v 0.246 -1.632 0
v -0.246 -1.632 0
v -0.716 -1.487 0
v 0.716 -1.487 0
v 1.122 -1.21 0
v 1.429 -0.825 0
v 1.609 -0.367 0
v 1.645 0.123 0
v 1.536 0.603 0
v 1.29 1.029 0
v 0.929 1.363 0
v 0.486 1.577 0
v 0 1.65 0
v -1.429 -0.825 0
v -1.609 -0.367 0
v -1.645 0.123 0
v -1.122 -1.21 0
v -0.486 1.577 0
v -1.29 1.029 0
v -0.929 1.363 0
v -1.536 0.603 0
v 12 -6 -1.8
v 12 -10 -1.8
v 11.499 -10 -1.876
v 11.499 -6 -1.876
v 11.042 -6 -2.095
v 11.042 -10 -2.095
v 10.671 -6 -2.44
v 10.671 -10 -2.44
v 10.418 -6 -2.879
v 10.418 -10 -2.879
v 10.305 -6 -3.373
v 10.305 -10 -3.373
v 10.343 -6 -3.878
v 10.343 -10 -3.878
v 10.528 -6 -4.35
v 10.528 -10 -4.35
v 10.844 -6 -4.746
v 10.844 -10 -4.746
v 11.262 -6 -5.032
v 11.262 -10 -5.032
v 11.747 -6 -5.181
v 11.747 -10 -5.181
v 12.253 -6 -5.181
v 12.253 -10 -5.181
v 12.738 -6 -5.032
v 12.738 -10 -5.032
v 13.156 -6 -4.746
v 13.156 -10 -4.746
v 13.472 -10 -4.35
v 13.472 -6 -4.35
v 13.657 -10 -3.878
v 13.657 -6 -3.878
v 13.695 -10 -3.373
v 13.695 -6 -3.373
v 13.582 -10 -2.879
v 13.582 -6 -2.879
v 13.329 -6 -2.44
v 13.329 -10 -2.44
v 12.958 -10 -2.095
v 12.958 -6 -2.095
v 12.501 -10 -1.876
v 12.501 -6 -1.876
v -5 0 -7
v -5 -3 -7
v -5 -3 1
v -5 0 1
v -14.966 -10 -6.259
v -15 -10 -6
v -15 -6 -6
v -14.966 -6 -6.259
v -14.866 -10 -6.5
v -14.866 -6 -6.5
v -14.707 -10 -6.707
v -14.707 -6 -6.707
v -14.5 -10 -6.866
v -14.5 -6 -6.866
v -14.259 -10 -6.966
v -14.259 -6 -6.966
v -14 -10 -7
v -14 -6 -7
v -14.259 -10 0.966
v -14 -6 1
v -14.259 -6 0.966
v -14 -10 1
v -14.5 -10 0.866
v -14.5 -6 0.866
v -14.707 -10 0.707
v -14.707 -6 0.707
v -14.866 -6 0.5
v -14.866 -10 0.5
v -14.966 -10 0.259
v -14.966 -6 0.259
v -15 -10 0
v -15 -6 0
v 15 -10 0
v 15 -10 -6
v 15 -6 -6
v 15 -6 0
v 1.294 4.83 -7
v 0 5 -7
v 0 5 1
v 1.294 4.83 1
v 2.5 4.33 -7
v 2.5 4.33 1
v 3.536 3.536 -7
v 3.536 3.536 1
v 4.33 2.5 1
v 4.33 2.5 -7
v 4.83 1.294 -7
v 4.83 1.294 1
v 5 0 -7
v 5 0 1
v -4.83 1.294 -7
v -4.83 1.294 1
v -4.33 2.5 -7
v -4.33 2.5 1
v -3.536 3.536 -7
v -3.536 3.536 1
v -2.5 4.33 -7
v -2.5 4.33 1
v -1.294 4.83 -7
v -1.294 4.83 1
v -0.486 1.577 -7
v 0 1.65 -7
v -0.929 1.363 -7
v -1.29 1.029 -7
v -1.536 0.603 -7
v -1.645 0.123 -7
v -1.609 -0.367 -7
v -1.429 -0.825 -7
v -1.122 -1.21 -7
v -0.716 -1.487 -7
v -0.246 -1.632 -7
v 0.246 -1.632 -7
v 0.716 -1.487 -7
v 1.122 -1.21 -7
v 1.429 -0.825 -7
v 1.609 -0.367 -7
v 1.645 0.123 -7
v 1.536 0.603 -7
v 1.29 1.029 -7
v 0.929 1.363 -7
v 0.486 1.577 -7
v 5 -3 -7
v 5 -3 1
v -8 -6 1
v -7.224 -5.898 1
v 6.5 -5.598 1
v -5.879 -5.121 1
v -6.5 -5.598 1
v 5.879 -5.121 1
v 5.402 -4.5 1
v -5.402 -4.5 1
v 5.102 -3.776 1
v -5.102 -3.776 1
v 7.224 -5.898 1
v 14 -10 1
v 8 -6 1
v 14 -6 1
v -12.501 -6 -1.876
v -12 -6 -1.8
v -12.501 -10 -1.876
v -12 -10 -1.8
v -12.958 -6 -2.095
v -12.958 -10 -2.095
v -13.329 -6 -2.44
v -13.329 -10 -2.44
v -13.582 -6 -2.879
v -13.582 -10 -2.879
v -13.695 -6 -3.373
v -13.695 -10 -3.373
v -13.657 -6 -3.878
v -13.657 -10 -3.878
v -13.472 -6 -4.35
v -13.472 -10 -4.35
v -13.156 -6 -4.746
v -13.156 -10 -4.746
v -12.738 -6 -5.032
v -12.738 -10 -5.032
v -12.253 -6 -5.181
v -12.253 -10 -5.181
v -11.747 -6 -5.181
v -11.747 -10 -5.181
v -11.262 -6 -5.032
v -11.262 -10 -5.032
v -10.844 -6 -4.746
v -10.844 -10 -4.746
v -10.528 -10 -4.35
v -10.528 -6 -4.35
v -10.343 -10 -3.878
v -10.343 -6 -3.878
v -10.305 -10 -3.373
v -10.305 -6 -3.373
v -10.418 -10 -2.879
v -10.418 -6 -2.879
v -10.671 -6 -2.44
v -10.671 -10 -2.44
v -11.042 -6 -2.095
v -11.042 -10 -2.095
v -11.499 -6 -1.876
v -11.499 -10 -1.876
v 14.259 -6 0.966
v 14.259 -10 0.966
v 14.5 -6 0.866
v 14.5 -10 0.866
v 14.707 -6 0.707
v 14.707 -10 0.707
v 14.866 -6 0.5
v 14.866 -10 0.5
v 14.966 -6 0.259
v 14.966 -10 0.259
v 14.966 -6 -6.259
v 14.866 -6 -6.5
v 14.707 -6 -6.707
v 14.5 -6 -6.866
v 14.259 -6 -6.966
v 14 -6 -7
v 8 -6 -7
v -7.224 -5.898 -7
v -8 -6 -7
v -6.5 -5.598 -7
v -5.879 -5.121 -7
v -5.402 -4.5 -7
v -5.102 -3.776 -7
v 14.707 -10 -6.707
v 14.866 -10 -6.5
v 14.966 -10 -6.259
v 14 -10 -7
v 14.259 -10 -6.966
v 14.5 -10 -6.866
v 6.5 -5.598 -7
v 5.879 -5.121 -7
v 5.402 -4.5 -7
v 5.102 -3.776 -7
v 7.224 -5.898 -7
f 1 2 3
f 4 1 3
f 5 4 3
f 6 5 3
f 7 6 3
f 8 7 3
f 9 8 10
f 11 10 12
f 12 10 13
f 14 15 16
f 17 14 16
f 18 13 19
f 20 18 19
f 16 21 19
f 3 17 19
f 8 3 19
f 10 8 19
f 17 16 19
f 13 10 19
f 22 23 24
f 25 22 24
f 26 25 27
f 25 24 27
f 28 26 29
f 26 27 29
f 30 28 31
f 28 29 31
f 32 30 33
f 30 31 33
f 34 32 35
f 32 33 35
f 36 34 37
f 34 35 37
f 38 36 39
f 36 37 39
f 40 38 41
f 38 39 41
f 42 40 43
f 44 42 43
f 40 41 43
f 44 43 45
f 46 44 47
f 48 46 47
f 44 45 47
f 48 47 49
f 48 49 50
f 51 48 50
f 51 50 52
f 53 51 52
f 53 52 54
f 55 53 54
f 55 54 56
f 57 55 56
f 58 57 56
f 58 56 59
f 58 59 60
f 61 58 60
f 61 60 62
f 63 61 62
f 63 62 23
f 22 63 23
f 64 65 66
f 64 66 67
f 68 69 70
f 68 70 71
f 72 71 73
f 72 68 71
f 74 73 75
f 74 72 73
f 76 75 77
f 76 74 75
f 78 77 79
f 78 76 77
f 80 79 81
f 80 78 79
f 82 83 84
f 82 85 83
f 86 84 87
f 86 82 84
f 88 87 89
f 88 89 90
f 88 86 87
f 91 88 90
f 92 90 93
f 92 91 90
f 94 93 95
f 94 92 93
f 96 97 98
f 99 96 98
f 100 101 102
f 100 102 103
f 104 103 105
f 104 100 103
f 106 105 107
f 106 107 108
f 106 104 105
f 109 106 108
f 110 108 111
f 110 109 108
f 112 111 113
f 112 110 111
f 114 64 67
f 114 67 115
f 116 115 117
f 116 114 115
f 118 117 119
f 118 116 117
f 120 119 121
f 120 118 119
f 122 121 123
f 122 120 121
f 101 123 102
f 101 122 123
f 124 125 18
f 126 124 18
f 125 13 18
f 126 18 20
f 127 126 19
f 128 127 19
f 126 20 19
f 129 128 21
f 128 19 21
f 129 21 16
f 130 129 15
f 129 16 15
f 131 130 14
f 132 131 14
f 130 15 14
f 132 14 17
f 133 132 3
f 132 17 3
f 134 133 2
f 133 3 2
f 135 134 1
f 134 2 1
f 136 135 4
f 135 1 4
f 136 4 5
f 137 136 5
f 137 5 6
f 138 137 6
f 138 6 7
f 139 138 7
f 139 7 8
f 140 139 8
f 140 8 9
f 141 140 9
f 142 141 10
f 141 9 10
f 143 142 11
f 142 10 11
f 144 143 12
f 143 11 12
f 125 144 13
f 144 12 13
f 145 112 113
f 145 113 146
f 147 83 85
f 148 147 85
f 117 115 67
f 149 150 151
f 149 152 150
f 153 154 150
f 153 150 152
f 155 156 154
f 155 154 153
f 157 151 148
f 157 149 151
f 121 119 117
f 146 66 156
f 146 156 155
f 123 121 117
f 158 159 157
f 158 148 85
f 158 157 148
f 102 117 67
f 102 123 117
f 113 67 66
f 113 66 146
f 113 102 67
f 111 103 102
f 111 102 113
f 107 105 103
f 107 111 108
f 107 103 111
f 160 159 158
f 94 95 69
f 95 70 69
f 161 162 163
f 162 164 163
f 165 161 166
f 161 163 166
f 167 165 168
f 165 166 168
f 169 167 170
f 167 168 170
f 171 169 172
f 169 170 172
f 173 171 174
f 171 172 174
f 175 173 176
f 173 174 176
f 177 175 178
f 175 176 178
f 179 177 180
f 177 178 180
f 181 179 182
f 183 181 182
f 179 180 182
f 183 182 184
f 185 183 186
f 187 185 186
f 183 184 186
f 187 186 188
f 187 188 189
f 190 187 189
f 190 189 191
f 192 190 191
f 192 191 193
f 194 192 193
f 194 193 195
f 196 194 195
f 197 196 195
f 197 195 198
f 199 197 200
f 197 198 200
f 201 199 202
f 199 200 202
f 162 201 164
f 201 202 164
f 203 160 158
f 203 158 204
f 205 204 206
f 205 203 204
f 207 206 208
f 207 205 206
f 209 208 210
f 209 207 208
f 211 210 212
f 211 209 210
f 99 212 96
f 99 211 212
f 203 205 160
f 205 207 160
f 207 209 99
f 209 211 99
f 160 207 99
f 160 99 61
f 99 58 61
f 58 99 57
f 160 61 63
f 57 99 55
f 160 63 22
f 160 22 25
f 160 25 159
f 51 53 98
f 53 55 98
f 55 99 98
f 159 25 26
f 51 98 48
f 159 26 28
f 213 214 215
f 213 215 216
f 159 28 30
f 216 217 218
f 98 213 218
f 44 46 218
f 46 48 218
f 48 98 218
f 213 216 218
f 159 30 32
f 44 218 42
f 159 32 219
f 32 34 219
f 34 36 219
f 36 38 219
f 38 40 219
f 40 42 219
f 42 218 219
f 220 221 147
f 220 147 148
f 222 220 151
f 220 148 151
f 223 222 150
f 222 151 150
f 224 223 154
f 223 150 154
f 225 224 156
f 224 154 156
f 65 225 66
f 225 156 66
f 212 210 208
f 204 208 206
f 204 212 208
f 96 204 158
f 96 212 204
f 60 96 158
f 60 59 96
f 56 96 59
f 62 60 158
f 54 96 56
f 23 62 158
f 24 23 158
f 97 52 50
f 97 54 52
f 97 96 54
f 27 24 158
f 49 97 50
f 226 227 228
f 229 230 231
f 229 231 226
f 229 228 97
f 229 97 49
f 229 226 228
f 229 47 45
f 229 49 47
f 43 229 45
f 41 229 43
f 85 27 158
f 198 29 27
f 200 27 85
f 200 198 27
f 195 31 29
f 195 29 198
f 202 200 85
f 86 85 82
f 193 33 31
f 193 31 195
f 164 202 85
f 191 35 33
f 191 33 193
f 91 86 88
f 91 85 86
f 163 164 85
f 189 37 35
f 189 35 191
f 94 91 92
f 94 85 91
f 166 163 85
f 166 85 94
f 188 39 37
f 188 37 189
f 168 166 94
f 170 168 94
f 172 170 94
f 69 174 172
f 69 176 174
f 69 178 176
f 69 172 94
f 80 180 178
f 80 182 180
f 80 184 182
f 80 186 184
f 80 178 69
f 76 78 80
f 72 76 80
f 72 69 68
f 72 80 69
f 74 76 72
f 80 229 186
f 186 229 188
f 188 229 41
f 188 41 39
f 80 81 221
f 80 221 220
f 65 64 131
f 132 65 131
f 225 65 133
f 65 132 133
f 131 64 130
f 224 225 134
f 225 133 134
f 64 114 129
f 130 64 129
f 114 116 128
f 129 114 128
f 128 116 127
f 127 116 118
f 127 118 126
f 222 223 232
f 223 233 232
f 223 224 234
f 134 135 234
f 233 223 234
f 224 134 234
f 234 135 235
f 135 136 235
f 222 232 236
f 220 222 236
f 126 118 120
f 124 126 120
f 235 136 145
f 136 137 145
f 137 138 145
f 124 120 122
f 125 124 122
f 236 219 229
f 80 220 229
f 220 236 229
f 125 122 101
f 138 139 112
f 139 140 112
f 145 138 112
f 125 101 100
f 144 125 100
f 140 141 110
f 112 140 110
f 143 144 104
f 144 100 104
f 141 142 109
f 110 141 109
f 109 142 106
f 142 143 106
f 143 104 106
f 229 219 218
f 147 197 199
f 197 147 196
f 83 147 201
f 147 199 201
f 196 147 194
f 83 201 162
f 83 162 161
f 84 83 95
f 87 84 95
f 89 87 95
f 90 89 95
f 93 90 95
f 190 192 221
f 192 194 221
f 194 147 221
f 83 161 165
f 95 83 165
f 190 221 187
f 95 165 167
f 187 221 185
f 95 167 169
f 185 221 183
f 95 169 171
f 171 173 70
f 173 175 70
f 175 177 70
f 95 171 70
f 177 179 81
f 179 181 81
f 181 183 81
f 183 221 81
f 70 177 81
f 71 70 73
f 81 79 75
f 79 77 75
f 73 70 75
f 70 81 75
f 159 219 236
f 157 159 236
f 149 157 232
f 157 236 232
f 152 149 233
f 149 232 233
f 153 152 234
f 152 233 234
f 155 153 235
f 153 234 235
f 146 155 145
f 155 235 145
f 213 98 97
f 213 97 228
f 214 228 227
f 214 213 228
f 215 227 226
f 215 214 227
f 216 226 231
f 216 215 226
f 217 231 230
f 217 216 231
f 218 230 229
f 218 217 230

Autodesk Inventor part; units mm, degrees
ref_plane "YZ Plane" through (0, 0, 0) normal (1, 0, 0) x (0, 1, 0)
ref_plane "XZ Plane" through (0, 0, 0) normal (0, 1, 0) x (-1, 0, 0)
ref_plane "XY Plane" through (0, 0, 0) normal (0, 0, 1) x (1, 0, 0)
sketch "Boceto1" plane through (0, 0, 0) normal (0, 0, 1) x (1, 0, 0)
  circle A0 centre (0, 0) radius 1.65
  line L0 (-15.5, -10) -> (35.5, -10) construction
  line L1 (5, -10) -> (-5, -10)
  line L2 (-5, -10) -> (-5, 5)
  line L3 (-5, 5) -> (5, 5)
  line L4 (5, 5) -> (5, -10)
  line L5 (-15, -10) -> (15, -10)
  line L6 (15, -10) -> (15, -6)
  line L7 (15, -6) -> (-15, -6)
  line L8 (-15, -6) -> (-15, -10)
  point P0 (-5, -6)
  point P1 (5, -6)
  dimension "d0" = 3.3
  dimension "d1" = 5
  dimension "d2" = 5
  dimension "d3" = 5
  dimension "d4" = 10
  dimension "d5" = 10
  dimension "d6" = 4
extrude "Extrusión1" add sketch "Boceto1" along normal blind 1 and the other way blind 7 contours A0 | L1 L2 L7 L4 | L4 L7 L6 L5 | L5 L8 L7 L2 | L7 L2 L3 L4
sketch "Boceto2" plane through (-15, -6, -7) normal (0, 1, 0) x (-1, 0, 0)
  line L0 (-30, 0) -> (-20, 0) construction
  line L1 (-30, 0) -> (-30, 8) construction
  line L2 (0, 8) -> (-10, 8) construction
  line L3 (0, 0) -> (0, 8) construction
  line L4 (-20, 8) -> (-30, 8) projected
  point P0 (-15, 7)
  point P1 (-3, 3.5)
  point P2 (-27, 3.5)
  dimension "d35" = 3.5
  dimension "d36" = 3
  dimension "d37" = 3.5
  dimension "d38" = 3
hole "Agujero1" at (-12, -6, -3.5) at (12, -6, -3.5) direction (0, -1, 0) diameter 3.4 end through all
fillet "Empalme1" radius 5 2 edges at (-5, 5, -3) (5, 5, -3)
fillet "Empalme2" radius 3 2 edges at (-5, -6, -3) (5, -6, -3)
fillet "Empalme3" radius 1 4 edges at (-15, -8, -7) (-15, -8, 1) (15, -8, -7) (15, -8, 1)
sketch "Boceto6" plane through (0, 0, -7) normal (0, 0, -1) x (-1, 0, 0)
  point P0 (0, 0)
hole "Agujero3" at (0, 0, -7) direction (0, 0, 1) diameter 3.3 depth 7
properties part number "SoporteEjes"
